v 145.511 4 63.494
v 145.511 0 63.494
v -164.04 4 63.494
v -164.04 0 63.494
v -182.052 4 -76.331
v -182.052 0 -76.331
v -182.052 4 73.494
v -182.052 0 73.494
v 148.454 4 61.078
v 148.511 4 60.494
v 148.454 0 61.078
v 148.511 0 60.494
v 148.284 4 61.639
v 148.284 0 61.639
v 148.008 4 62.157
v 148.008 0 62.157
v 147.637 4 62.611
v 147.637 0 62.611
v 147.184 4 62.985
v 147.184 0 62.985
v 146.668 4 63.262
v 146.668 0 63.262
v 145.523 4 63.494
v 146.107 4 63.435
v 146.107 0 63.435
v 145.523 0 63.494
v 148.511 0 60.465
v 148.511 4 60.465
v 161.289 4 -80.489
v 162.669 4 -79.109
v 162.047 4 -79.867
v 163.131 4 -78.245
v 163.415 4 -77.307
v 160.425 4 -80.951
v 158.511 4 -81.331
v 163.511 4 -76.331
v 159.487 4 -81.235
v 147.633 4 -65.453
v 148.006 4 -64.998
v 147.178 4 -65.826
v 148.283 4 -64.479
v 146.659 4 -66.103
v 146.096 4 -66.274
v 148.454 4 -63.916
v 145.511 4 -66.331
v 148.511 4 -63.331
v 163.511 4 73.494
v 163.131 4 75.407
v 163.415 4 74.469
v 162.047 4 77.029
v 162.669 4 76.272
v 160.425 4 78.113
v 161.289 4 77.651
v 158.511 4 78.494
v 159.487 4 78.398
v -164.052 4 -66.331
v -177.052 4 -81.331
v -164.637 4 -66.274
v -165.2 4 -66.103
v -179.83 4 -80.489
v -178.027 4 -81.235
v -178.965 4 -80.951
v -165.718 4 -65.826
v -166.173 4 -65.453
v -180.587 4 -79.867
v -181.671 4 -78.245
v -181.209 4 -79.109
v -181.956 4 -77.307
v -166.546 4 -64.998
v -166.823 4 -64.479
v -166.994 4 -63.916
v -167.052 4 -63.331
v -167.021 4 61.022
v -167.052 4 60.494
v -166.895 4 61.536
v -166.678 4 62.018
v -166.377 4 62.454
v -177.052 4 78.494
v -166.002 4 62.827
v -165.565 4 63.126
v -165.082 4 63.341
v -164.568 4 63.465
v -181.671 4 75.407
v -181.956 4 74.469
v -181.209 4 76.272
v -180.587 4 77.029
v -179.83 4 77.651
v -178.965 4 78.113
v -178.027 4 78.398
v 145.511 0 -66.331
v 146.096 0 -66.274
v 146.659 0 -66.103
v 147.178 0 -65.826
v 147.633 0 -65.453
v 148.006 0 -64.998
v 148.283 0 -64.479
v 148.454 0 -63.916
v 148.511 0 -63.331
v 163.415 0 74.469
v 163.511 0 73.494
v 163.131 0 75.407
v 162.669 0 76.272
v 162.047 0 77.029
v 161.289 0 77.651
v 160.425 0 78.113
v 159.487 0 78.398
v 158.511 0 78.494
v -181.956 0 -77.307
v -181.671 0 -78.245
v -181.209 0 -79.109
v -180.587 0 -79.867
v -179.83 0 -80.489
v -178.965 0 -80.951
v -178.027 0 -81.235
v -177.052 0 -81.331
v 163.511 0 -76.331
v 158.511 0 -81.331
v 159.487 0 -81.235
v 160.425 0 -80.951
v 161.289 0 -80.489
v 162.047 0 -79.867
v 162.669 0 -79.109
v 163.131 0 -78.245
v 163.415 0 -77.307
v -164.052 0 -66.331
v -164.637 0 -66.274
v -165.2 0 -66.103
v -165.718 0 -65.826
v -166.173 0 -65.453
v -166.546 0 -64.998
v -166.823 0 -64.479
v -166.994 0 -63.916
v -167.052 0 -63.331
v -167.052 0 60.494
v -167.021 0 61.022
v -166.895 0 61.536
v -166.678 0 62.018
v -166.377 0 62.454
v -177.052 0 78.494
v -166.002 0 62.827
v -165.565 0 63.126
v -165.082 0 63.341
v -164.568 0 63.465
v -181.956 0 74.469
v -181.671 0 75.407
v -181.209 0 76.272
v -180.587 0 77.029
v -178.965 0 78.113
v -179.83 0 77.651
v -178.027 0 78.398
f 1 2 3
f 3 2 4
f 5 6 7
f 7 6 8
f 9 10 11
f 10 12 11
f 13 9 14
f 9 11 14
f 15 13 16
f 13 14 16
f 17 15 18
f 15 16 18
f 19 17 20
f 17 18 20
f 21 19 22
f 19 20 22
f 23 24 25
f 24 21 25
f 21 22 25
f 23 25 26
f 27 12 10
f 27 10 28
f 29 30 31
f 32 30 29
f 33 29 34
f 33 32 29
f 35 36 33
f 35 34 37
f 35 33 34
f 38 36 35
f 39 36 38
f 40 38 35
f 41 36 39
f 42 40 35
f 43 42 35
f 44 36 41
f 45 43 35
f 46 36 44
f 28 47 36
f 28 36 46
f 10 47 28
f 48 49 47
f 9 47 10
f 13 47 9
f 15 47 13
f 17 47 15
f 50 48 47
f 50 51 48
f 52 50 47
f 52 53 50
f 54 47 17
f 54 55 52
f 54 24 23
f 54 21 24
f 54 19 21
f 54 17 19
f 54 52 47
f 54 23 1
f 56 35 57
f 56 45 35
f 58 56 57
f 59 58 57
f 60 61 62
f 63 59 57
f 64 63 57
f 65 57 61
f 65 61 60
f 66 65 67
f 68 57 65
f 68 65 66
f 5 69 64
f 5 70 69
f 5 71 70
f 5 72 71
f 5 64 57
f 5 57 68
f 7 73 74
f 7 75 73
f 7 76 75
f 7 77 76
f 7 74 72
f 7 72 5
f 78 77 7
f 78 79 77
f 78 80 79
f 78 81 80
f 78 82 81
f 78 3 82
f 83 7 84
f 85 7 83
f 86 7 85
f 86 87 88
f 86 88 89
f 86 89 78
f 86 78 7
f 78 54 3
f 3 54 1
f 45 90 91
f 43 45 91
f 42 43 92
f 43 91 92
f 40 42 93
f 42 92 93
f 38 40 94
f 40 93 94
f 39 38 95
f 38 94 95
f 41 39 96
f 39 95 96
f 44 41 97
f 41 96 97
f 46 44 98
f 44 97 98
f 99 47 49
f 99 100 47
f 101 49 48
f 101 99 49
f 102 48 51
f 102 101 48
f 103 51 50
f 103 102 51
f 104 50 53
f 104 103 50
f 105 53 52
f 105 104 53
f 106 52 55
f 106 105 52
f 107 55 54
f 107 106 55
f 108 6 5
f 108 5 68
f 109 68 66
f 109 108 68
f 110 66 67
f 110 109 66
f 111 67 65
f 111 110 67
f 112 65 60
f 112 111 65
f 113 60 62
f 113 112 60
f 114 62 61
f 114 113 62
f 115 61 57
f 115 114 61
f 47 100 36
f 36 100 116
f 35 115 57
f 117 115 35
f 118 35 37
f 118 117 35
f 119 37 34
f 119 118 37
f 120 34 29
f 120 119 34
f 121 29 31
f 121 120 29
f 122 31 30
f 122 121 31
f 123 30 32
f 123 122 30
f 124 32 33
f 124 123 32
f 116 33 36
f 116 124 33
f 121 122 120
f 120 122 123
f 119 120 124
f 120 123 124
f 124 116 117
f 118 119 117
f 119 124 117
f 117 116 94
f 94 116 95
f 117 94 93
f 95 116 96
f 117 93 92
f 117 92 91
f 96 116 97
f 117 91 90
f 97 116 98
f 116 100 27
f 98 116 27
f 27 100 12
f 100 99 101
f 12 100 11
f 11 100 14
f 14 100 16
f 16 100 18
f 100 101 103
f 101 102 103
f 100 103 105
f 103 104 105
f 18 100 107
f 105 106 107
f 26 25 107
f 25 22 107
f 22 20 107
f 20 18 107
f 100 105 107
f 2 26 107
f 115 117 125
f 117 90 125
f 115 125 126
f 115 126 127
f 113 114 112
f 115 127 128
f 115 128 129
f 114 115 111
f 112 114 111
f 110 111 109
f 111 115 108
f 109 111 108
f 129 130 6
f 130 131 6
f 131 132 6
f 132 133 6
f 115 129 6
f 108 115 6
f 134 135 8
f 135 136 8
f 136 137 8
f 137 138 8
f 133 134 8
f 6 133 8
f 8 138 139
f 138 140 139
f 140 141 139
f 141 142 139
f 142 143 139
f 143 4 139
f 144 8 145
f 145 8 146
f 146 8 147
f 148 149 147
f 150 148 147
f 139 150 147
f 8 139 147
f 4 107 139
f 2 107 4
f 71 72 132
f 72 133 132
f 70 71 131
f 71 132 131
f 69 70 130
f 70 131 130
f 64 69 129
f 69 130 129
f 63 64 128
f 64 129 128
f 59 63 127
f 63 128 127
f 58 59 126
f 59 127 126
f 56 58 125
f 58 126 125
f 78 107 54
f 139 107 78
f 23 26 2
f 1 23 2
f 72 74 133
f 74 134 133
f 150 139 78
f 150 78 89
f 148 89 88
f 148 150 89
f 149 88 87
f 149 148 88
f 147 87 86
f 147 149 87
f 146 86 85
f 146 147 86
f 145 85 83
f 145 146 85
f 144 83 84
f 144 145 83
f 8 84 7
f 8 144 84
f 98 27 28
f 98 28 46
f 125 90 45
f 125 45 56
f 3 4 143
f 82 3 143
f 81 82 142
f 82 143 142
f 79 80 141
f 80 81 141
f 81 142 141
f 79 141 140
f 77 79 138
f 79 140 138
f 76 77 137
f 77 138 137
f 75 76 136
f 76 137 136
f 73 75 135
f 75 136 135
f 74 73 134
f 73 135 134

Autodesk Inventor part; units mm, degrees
ref_plane "YZ Plane" through (0, 0, 0) normal (1, 0, 0) x (0, 1, 0)
ref_plane "XZ Plane" through (0, 0, 0) normal (0, 1, 0) x (-1, 0, 0)
ref_plane "XY Plane" through (0, 0, 0) normal (0, 0, 1) x (1, 0, 0)
sketch "Sketch1" plane through (0, 0, 0) normal (0, 1, 0) x (-1, 0, 0)
  line L0 (-163.5112, 73.4938) -> (-163.5112, -76.3312)
  line L1 (-158.5112, 78.4938) -> (177.0518, 78.4938)
  arc A0 (-158.5112, 78.4938) -> (-163.5112, 73.4938) centre (-158.5112, 73.4938) ccw
  arc A1 (-163.5112, -76.3312) -> (-158.5112, -81.3312) centre (-158.5112, -76.3312) ccw
  line L2 (182.0518, -76.3312) -> (182.0518, 73.4938)
  line L3 (177.0518, -81.3312) -> (-158.5112, -81.3312)
  arc A2 (177.0518, -81.3312) -> (182.0518, -76.3312) centre (177.0518, -76.3312) ccw
  arc A3 (182.0518, 73.4938) -> (177.0518, 78.4938) centre (177.0518, 73.4938) ccw
  line L4 (-145.5232, 63.4943) -> (164.0397, 63.4943)
  line L5 (-148.5112, 60.4941) -> (-148.5112, -63.3312)
  line L6 (167.0517, 60.4941) -> (167.0517, -63.3312)
  line L7 (-145.5112, -66.3312) -> (164.0517, -66.3312)
  arc A4 (-145.5112, 63.4943) -> (-148.5112, 60.4648) centre (-145.5112, 60.4941) ccw
  arc A5 (167.0517, 60.4941) -> (164.0397, 63.4943) centre (164.1459, 60.5889) ccw
  arc A6 (164.0517, -66.3312) -> (167.0517, -63.3312) centre (164.0517, -63.3312) ccw
  arc A7 (-148.5112, -63.3312) -> (-145.5112, -66.3312) centre (-145.5112, -63.3312) ccw
  point P0 (0, 0)
extrude "Extrusion1" add sketch "Sketch1" along normal blind 4
properties part number "layer2"
